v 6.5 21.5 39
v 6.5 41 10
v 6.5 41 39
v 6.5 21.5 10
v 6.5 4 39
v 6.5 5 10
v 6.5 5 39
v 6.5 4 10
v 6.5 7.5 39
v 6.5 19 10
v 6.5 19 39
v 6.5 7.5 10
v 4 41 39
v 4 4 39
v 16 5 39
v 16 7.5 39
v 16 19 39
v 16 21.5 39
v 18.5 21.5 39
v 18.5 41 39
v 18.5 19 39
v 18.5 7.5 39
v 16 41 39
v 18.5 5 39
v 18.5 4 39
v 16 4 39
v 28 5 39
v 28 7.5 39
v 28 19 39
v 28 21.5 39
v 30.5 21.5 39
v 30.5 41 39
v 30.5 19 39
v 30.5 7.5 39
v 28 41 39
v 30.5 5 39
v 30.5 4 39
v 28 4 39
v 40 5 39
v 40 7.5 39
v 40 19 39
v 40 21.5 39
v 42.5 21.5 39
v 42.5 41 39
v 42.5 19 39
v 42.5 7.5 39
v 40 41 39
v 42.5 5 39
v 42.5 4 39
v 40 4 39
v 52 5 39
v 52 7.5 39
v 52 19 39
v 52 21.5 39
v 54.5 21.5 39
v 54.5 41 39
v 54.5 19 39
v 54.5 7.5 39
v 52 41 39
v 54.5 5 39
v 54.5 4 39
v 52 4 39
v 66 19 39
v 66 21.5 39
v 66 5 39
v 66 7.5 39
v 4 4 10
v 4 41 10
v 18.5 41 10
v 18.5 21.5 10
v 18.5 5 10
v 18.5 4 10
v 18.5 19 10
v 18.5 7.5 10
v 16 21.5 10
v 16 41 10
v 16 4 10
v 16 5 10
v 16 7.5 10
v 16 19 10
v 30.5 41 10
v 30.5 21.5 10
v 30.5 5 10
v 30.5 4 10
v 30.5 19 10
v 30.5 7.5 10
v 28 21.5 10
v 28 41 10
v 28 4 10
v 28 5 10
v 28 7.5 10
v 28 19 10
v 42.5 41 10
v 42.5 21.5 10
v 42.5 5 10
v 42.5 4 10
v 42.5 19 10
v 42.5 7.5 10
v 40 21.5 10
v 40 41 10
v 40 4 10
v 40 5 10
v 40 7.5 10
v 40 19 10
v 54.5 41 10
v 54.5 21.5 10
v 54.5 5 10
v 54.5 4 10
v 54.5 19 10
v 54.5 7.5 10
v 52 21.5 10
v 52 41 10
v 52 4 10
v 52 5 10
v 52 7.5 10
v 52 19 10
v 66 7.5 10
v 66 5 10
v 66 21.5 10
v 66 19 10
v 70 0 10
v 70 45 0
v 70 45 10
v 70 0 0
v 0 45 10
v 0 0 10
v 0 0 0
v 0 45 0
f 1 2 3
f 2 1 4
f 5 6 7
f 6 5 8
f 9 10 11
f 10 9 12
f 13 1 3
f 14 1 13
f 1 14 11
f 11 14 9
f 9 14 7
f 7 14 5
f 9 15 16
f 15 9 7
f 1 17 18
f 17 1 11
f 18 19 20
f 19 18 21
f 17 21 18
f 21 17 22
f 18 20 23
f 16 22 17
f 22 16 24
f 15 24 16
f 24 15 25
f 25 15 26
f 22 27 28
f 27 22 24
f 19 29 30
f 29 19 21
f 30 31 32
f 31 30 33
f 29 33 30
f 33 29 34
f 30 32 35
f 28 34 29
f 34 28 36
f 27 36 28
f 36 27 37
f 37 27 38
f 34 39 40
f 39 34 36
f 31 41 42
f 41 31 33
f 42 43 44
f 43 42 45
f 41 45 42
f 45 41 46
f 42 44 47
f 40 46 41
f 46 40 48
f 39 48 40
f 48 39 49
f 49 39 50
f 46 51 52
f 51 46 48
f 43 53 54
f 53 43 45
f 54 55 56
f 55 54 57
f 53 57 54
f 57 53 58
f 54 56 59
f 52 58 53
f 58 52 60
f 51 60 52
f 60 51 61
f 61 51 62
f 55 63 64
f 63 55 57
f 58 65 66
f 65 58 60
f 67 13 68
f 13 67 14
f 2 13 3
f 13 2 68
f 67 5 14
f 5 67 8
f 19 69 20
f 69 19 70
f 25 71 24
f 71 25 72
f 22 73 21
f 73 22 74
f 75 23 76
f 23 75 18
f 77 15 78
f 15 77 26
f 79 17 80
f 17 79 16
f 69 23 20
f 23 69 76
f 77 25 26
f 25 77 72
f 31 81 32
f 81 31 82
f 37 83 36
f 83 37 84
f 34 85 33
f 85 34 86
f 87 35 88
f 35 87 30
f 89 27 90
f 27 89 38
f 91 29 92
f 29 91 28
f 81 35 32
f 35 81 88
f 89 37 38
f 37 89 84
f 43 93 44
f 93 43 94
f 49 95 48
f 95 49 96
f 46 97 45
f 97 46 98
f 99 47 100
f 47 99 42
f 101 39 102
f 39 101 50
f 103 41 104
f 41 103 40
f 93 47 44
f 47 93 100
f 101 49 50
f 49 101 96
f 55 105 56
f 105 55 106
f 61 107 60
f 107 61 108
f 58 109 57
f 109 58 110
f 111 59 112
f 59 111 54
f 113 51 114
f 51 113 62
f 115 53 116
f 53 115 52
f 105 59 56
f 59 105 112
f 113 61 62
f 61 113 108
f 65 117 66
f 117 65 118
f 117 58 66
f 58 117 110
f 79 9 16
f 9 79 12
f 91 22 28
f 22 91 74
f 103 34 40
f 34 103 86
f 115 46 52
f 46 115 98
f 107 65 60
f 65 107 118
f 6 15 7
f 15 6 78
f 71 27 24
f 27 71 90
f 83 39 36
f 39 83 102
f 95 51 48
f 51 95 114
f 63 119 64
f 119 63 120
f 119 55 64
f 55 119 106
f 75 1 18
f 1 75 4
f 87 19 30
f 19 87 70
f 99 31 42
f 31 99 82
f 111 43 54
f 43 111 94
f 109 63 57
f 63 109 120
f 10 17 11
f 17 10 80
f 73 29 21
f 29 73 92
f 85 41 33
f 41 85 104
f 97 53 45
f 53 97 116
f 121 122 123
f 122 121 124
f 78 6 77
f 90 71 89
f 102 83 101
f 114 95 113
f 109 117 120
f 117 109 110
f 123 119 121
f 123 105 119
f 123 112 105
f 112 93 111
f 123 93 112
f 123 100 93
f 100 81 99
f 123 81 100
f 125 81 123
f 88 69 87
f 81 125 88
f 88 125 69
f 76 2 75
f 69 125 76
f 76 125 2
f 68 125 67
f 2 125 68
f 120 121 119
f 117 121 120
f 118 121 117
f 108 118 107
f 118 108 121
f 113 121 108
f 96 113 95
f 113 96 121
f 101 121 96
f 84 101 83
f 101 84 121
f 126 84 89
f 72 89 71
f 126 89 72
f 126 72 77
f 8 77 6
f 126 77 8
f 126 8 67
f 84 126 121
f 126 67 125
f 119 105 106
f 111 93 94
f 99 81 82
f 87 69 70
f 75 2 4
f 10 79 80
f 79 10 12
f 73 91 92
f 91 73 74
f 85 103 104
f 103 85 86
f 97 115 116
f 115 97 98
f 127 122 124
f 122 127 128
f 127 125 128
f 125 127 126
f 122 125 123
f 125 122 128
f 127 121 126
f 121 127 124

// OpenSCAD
$fn = 32;

// ----------------------------------------------------------------------
// Heatsink: cross fin block
// ----------------------------------------------------------------------

// --- parameters (mm) ---
base_l = 70;              // base length, X
base_w = 45;              // base width, Y
base_t = 10;              // base plate thickness
fin_h = 30;               // fin height above the base
fin_t = 2.5;              // fin thickness
edge = 4;                 // margin from the base ends
pitch = 12;               // fin pitch
rib_pitch = 14;           // cross rib pitch
fit_tol = 0.1;            // tolerance for press fits, mm
free_tol = 0.5;           // tolerance for clearance fits, mm

n_fins = floor((base_l - 2 * edge - fin_t) / pitch) + 1;  // fin count
total_h = base_t + fin_h - 1;  // overall height
n_ribs = floor((base_w - 2 * edge) / rib_pitch);  // rib count

union() {
  cube([base_l, base_w, base_t]);
  for (i = [0 : n_fins - 1])
    translate([edge + i * pitch, edge, base_t - 1])
      cube([fin_t, base_w - 2 * edge, fin_h]);
  for (i = [0 : n_ribs - 1])
    translate([edge, edge + 1 + i * rib_pitch, base_t - 1])
      cube([base_l - 2 * edge, fin_t, fin_h]);
}
